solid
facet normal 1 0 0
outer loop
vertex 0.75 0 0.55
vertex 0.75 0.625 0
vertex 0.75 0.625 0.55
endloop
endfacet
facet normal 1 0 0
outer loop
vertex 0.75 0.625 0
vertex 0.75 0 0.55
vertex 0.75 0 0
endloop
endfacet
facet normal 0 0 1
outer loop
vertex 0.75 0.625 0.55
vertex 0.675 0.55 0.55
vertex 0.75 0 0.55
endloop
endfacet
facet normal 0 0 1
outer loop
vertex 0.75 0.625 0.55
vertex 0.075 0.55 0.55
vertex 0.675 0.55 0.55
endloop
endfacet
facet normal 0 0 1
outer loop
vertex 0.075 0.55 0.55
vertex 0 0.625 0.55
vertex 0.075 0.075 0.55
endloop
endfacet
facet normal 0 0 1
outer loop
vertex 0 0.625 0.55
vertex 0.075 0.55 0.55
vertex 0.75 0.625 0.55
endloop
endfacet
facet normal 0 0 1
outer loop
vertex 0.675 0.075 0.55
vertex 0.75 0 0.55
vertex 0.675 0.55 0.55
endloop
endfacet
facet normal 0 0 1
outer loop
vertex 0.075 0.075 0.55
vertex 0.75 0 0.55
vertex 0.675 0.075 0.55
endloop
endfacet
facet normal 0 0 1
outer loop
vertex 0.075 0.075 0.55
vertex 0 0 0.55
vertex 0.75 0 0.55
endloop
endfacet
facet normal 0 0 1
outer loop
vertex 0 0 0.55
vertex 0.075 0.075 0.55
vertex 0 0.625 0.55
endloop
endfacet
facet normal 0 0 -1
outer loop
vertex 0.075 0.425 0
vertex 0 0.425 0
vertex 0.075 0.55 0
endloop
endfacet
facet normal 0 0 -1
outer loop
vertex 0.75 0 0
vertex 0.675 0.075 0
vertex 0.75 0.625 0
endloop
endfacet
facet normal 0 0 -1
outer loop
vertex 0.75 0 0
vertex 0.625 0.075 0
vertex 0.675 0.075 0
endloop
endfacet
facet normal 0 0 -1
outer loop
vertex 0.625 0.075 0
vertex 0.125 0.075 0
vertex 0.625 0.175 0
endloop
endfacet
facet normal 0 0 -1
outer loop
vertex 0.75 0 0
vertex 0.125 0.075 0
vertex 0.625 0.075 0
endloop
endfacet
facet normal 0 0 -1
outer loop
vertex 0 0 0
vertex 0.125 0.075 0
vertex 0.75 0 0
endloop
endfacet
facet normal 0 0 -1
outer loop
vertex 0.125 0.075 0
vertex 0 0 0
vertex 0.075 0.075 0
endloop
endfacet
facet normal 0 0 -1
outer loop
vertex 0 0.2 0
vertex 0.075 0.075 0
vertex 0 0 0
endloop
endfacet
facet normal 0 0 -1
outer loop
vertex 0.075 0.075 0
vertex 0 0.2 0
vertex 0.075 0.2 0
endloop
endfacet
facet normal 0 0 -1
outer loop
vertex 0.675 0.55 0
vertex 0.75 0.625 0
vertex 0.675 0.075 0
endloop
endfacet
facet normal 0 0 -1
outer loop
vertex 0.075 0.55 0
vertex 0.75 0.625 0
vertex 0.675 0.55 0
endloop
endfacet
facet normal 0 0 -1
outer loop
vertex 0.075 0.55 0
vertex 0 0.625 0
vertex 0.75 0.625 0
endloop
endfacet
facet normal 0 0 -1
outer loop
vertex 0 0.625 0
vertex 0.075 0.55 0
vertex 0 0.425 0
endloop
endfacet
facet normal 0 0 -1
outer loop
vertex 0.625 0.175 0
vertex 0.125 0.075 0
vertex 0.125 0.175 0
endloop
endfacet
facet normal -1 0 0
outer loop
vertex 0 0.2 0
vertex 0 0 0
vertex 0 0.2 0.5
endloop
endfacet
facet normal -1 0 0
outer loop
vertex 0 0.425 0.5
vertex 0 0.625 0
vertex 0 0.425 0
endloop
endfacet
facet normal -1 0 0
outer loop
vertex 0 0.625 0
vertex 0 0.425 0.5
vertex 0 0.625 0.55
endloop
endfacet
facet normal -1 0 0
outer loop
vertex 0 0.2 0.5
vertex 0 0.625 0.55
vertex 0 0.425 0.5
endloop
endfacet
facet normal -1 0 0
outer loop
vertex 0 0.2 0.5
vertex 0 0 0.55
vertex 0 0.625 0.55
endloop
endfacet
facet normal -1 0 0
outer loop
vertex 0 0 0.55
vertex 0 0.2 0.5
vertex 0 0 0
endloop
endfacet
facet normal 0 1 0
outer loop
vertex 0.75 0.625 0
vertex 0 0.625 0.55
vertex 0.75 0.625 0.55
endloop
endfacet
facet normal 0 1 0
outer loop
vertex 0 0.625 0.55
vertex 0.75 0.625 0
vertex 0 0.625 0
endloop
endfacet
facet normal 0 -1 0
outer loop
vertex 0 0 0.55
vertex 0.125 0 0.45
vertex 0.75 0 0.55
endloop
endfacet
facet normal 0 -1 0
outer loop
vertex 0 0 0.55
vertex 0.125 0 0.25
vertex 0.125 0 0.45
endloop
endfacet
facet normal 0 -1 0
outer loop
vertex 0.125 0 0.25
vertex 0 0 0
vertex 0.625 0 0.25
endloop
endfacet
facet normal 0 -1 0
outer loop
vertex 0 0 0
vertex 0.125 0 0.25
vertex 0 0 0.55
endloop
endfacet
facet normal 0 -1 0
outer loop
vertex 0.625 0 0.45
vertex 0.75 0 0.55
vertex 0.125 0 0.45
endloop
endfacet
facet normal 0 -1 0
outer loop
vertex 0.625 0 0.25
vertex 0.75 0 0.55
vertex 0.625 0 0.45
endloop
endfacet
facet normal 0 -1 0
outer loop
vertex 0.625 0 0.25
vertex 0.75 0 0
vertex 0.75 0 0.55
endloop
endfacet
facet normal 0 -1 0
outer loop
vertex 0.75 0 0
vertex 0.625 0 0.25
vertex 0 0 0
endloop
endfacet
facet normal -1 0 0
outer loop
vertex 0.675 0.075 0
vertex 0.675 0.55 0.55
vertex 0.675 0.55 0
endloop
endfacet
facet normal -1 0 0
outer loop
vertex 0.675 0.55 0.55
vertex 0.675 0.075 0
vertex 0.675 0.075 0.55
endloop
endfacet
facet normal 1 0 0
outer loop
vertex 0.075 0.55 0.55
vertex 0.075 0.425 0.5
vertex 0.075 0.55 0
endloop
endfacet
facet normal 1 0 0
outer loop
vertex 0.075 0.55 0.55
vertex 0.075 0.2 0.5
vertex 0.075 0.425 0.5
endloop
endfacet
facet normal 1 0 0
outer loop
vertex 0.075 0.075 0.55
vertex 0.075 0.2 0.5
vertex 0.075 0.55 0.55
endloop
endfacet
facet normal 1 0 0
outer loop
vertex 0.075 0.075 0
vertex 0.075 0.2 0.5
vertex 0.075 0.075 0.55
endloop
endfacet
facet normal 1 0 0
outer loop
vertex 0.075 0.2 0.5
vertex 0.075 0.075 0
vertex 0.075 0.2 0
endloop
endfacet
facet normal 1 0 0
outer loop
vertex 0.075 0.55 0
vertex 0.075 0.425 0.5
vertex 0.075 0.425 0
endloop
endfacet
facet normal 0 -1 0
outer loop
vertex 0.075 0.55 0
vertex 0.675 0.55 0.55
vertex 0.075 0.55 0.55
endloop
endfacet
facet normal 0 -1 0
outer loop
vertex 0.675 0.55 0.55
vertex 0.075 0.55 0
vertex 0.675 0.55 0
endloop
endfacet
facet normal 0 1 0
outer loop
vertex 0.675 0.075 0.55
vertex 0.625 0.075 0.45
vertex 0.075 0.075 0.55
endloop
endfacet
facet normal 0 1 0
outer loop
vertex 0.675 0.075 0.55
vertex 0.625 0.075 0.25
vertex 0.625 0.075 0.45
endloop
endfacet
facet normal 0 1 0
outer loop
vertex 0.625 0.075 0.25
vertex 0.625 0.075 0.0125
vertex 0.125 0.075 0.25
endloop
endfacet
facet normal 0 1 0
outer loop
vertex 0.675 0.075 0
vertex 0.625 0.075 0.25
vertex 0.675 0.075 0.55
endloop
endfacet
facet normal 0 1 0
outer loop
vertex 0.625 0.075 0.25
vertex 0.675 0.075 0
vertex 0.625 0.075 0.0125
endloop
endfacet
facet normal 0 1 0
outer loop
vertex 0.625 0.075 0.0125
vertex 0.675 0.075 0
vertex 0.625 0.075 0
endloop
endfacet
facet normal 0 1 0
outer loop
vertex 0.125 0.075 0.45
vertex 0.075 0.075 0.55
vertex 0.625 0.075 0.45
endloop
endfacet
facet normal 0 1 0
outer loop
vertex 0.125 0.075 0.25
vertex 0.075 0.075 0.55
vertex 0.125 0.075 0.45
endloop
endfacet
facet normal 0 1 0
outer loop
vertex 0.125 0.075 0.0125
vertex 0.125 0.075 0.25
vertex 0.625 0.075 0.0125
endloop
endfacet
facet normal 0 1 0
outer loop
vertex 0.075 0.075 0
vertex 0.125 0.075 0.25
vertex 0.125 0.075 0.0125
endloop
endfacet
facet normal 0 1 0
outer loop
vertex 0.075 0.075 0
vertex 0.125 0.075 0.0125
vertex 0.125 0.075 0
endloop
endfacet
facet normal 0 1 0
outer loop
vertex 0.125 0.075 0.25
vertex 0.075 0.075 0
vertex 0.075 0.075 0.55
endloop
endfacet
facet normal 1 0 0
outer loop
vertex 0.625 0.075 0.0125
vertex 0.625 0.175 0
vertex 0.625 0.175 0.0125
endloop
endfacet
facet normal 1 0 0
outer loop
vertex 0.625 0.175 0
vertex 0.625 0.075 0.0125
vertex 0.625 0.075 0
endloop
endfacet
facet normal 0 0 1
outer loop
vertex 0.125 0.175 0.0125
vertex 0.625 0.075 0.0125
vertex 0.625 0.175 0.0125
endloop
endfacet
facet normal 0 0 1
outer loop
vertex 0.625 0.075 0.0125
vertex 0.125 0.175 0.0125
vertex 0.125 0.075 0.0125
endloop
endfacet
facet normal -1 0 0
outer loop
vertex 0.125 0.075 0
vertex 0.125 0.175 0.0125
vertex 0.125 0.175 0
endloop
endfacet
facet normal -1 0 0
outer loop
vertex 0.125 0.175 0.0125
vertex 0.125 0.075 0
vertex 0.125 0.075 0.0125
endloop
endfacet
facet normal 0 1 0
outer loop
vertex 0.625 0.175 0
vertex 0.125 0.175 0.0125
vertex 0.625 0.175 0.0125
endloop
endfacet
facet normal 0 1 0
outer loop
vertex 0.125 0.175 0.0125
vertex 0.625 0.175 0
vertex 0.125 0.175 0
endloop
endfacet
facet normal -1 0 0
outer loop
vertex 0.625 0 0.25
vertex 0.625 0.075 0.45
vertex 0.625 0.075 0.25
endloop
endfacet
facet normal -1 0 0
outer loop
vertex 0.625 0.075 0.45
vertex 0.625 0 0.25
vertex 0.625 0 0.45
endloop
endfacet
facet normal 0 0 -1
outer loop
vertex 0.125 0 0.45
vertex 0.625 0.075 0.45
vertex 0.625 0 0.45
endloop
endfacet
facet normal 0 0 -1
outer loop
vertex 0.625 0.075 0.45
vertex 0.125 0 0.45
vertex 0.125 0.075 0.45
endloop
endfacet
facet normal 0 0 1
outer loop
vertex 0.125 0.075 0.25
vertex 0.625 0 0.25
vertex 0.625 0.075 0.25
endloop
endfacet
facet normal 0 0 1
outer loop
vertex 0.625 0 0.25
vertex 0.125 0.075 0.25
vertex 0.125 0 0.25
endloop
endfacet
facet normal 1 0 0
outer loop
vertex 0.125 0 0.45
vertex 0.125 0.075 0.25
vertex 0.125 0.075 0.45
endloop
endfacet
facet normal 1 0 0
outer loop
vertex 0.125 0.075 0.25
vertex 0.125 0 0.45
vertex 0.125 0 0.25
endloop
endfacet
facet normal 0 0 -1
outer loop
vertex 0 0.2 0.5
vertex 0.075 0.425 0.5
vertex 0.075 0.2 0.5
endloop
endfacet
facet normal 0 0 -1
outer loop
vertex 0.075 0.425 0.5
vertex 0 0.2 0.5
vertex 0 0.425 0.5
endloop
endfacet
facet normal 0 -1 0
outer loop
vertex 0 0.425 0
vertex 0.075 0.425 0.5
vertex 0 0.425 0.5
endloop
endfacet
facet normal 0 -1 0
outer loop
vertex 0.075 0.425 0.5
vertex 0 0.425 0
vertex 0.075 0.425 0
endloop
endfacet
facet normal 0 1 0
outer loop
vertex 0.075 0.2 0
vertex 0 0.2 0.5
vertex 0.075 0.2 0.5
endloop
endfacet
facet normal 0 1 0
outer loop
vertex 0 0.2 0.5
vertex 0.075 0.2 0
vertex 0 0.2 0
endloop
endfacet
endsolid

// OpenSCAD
// Parameters
$fn = 32;
eps = 0.001;

// Coordinate system: X left-right, Y front-back, Z up
outer_x = 0.75;
outer_y = 0.625;
outer_z = 0.55;

wall_t = 0.075;

// Front wall cut
front_cut_len = 0.5;
front_cut_side_margin = (outer_x - front_cut_len) / 2; // 0.125
front_cut_depth = 0.075;
front_cut_z0 = 0.25;
front_cut_z1 = 0.45;

// Left side opening
left_open_depth = 0.075;
left_open_right_clearance = outer_x - left_open_depth; // 0.675
left_open_front_margin = 0.2;
left_open_back_margin = 0.2;
left_open_span = outer_y - left_open_front_margin - left_open_back_margin; // 0.225
left_open_z0 = 0;
left_open_z1 = 0.5;

// Internal front ledge
ledge_len = 0.5;
ledge_side_margin = (outer_x - ledge_len) / 2; // 0.125
ledge_width = 0.1;
ledge_thickness = 0.0125;
ledge_overlap = eps;

// Derived inner void
inner_x = outer_x - 2 * wall_t;
inner_y = outer_y - 2 * wall_t;

// Helper
module prism(pos, size) {
    translate(pos)
        cube(size, center=false);
}

// Open-top hollow wall body
module hollow_wall_body() {
    difference() {
        prism([0, 0, 0], [outer_x, outer_y, outer_z]);

        // Rectangular inner void
        prism(
            [wall_t, wall_t, -eps],
            [inner_x, inner_y, outer_z + 2 * eps]
        );
    }
}

// Thin internal front ledge
module front_inside_ledge() {
    prism(
        [ledge_side_margin, wall_t - ledge_overlap, 0],
        [ledge_len, ledge_width + ledge_overlap, ledge_thickness]
    );
}

// Horizontal front wall cut
module front_wall_cut() {
    prism(
        [front_cut_side_margin, -eps, front_cut_z0],
        [front_cut_len, front_cut_depth + 2 * eps, front_cut_z1 - front_cut_z0]
    );
}

// Vertical left side opening
module left_side_opening() {
    prism(
        [-eps, left_open_front_margin, left_open_z0 - eps],
        [left_open_depth + 2 * eps, left_open_span, left_open_z1 - left_open_z0 + eps]
    );
}

// Main model
module enclosure_model() {
    difference() {
        union() {
            hollow_wall_body();
            front_inside_ledge();
        }

        front_wall_cut();
        left_side_opening();
    }
}

enclosure_model();
